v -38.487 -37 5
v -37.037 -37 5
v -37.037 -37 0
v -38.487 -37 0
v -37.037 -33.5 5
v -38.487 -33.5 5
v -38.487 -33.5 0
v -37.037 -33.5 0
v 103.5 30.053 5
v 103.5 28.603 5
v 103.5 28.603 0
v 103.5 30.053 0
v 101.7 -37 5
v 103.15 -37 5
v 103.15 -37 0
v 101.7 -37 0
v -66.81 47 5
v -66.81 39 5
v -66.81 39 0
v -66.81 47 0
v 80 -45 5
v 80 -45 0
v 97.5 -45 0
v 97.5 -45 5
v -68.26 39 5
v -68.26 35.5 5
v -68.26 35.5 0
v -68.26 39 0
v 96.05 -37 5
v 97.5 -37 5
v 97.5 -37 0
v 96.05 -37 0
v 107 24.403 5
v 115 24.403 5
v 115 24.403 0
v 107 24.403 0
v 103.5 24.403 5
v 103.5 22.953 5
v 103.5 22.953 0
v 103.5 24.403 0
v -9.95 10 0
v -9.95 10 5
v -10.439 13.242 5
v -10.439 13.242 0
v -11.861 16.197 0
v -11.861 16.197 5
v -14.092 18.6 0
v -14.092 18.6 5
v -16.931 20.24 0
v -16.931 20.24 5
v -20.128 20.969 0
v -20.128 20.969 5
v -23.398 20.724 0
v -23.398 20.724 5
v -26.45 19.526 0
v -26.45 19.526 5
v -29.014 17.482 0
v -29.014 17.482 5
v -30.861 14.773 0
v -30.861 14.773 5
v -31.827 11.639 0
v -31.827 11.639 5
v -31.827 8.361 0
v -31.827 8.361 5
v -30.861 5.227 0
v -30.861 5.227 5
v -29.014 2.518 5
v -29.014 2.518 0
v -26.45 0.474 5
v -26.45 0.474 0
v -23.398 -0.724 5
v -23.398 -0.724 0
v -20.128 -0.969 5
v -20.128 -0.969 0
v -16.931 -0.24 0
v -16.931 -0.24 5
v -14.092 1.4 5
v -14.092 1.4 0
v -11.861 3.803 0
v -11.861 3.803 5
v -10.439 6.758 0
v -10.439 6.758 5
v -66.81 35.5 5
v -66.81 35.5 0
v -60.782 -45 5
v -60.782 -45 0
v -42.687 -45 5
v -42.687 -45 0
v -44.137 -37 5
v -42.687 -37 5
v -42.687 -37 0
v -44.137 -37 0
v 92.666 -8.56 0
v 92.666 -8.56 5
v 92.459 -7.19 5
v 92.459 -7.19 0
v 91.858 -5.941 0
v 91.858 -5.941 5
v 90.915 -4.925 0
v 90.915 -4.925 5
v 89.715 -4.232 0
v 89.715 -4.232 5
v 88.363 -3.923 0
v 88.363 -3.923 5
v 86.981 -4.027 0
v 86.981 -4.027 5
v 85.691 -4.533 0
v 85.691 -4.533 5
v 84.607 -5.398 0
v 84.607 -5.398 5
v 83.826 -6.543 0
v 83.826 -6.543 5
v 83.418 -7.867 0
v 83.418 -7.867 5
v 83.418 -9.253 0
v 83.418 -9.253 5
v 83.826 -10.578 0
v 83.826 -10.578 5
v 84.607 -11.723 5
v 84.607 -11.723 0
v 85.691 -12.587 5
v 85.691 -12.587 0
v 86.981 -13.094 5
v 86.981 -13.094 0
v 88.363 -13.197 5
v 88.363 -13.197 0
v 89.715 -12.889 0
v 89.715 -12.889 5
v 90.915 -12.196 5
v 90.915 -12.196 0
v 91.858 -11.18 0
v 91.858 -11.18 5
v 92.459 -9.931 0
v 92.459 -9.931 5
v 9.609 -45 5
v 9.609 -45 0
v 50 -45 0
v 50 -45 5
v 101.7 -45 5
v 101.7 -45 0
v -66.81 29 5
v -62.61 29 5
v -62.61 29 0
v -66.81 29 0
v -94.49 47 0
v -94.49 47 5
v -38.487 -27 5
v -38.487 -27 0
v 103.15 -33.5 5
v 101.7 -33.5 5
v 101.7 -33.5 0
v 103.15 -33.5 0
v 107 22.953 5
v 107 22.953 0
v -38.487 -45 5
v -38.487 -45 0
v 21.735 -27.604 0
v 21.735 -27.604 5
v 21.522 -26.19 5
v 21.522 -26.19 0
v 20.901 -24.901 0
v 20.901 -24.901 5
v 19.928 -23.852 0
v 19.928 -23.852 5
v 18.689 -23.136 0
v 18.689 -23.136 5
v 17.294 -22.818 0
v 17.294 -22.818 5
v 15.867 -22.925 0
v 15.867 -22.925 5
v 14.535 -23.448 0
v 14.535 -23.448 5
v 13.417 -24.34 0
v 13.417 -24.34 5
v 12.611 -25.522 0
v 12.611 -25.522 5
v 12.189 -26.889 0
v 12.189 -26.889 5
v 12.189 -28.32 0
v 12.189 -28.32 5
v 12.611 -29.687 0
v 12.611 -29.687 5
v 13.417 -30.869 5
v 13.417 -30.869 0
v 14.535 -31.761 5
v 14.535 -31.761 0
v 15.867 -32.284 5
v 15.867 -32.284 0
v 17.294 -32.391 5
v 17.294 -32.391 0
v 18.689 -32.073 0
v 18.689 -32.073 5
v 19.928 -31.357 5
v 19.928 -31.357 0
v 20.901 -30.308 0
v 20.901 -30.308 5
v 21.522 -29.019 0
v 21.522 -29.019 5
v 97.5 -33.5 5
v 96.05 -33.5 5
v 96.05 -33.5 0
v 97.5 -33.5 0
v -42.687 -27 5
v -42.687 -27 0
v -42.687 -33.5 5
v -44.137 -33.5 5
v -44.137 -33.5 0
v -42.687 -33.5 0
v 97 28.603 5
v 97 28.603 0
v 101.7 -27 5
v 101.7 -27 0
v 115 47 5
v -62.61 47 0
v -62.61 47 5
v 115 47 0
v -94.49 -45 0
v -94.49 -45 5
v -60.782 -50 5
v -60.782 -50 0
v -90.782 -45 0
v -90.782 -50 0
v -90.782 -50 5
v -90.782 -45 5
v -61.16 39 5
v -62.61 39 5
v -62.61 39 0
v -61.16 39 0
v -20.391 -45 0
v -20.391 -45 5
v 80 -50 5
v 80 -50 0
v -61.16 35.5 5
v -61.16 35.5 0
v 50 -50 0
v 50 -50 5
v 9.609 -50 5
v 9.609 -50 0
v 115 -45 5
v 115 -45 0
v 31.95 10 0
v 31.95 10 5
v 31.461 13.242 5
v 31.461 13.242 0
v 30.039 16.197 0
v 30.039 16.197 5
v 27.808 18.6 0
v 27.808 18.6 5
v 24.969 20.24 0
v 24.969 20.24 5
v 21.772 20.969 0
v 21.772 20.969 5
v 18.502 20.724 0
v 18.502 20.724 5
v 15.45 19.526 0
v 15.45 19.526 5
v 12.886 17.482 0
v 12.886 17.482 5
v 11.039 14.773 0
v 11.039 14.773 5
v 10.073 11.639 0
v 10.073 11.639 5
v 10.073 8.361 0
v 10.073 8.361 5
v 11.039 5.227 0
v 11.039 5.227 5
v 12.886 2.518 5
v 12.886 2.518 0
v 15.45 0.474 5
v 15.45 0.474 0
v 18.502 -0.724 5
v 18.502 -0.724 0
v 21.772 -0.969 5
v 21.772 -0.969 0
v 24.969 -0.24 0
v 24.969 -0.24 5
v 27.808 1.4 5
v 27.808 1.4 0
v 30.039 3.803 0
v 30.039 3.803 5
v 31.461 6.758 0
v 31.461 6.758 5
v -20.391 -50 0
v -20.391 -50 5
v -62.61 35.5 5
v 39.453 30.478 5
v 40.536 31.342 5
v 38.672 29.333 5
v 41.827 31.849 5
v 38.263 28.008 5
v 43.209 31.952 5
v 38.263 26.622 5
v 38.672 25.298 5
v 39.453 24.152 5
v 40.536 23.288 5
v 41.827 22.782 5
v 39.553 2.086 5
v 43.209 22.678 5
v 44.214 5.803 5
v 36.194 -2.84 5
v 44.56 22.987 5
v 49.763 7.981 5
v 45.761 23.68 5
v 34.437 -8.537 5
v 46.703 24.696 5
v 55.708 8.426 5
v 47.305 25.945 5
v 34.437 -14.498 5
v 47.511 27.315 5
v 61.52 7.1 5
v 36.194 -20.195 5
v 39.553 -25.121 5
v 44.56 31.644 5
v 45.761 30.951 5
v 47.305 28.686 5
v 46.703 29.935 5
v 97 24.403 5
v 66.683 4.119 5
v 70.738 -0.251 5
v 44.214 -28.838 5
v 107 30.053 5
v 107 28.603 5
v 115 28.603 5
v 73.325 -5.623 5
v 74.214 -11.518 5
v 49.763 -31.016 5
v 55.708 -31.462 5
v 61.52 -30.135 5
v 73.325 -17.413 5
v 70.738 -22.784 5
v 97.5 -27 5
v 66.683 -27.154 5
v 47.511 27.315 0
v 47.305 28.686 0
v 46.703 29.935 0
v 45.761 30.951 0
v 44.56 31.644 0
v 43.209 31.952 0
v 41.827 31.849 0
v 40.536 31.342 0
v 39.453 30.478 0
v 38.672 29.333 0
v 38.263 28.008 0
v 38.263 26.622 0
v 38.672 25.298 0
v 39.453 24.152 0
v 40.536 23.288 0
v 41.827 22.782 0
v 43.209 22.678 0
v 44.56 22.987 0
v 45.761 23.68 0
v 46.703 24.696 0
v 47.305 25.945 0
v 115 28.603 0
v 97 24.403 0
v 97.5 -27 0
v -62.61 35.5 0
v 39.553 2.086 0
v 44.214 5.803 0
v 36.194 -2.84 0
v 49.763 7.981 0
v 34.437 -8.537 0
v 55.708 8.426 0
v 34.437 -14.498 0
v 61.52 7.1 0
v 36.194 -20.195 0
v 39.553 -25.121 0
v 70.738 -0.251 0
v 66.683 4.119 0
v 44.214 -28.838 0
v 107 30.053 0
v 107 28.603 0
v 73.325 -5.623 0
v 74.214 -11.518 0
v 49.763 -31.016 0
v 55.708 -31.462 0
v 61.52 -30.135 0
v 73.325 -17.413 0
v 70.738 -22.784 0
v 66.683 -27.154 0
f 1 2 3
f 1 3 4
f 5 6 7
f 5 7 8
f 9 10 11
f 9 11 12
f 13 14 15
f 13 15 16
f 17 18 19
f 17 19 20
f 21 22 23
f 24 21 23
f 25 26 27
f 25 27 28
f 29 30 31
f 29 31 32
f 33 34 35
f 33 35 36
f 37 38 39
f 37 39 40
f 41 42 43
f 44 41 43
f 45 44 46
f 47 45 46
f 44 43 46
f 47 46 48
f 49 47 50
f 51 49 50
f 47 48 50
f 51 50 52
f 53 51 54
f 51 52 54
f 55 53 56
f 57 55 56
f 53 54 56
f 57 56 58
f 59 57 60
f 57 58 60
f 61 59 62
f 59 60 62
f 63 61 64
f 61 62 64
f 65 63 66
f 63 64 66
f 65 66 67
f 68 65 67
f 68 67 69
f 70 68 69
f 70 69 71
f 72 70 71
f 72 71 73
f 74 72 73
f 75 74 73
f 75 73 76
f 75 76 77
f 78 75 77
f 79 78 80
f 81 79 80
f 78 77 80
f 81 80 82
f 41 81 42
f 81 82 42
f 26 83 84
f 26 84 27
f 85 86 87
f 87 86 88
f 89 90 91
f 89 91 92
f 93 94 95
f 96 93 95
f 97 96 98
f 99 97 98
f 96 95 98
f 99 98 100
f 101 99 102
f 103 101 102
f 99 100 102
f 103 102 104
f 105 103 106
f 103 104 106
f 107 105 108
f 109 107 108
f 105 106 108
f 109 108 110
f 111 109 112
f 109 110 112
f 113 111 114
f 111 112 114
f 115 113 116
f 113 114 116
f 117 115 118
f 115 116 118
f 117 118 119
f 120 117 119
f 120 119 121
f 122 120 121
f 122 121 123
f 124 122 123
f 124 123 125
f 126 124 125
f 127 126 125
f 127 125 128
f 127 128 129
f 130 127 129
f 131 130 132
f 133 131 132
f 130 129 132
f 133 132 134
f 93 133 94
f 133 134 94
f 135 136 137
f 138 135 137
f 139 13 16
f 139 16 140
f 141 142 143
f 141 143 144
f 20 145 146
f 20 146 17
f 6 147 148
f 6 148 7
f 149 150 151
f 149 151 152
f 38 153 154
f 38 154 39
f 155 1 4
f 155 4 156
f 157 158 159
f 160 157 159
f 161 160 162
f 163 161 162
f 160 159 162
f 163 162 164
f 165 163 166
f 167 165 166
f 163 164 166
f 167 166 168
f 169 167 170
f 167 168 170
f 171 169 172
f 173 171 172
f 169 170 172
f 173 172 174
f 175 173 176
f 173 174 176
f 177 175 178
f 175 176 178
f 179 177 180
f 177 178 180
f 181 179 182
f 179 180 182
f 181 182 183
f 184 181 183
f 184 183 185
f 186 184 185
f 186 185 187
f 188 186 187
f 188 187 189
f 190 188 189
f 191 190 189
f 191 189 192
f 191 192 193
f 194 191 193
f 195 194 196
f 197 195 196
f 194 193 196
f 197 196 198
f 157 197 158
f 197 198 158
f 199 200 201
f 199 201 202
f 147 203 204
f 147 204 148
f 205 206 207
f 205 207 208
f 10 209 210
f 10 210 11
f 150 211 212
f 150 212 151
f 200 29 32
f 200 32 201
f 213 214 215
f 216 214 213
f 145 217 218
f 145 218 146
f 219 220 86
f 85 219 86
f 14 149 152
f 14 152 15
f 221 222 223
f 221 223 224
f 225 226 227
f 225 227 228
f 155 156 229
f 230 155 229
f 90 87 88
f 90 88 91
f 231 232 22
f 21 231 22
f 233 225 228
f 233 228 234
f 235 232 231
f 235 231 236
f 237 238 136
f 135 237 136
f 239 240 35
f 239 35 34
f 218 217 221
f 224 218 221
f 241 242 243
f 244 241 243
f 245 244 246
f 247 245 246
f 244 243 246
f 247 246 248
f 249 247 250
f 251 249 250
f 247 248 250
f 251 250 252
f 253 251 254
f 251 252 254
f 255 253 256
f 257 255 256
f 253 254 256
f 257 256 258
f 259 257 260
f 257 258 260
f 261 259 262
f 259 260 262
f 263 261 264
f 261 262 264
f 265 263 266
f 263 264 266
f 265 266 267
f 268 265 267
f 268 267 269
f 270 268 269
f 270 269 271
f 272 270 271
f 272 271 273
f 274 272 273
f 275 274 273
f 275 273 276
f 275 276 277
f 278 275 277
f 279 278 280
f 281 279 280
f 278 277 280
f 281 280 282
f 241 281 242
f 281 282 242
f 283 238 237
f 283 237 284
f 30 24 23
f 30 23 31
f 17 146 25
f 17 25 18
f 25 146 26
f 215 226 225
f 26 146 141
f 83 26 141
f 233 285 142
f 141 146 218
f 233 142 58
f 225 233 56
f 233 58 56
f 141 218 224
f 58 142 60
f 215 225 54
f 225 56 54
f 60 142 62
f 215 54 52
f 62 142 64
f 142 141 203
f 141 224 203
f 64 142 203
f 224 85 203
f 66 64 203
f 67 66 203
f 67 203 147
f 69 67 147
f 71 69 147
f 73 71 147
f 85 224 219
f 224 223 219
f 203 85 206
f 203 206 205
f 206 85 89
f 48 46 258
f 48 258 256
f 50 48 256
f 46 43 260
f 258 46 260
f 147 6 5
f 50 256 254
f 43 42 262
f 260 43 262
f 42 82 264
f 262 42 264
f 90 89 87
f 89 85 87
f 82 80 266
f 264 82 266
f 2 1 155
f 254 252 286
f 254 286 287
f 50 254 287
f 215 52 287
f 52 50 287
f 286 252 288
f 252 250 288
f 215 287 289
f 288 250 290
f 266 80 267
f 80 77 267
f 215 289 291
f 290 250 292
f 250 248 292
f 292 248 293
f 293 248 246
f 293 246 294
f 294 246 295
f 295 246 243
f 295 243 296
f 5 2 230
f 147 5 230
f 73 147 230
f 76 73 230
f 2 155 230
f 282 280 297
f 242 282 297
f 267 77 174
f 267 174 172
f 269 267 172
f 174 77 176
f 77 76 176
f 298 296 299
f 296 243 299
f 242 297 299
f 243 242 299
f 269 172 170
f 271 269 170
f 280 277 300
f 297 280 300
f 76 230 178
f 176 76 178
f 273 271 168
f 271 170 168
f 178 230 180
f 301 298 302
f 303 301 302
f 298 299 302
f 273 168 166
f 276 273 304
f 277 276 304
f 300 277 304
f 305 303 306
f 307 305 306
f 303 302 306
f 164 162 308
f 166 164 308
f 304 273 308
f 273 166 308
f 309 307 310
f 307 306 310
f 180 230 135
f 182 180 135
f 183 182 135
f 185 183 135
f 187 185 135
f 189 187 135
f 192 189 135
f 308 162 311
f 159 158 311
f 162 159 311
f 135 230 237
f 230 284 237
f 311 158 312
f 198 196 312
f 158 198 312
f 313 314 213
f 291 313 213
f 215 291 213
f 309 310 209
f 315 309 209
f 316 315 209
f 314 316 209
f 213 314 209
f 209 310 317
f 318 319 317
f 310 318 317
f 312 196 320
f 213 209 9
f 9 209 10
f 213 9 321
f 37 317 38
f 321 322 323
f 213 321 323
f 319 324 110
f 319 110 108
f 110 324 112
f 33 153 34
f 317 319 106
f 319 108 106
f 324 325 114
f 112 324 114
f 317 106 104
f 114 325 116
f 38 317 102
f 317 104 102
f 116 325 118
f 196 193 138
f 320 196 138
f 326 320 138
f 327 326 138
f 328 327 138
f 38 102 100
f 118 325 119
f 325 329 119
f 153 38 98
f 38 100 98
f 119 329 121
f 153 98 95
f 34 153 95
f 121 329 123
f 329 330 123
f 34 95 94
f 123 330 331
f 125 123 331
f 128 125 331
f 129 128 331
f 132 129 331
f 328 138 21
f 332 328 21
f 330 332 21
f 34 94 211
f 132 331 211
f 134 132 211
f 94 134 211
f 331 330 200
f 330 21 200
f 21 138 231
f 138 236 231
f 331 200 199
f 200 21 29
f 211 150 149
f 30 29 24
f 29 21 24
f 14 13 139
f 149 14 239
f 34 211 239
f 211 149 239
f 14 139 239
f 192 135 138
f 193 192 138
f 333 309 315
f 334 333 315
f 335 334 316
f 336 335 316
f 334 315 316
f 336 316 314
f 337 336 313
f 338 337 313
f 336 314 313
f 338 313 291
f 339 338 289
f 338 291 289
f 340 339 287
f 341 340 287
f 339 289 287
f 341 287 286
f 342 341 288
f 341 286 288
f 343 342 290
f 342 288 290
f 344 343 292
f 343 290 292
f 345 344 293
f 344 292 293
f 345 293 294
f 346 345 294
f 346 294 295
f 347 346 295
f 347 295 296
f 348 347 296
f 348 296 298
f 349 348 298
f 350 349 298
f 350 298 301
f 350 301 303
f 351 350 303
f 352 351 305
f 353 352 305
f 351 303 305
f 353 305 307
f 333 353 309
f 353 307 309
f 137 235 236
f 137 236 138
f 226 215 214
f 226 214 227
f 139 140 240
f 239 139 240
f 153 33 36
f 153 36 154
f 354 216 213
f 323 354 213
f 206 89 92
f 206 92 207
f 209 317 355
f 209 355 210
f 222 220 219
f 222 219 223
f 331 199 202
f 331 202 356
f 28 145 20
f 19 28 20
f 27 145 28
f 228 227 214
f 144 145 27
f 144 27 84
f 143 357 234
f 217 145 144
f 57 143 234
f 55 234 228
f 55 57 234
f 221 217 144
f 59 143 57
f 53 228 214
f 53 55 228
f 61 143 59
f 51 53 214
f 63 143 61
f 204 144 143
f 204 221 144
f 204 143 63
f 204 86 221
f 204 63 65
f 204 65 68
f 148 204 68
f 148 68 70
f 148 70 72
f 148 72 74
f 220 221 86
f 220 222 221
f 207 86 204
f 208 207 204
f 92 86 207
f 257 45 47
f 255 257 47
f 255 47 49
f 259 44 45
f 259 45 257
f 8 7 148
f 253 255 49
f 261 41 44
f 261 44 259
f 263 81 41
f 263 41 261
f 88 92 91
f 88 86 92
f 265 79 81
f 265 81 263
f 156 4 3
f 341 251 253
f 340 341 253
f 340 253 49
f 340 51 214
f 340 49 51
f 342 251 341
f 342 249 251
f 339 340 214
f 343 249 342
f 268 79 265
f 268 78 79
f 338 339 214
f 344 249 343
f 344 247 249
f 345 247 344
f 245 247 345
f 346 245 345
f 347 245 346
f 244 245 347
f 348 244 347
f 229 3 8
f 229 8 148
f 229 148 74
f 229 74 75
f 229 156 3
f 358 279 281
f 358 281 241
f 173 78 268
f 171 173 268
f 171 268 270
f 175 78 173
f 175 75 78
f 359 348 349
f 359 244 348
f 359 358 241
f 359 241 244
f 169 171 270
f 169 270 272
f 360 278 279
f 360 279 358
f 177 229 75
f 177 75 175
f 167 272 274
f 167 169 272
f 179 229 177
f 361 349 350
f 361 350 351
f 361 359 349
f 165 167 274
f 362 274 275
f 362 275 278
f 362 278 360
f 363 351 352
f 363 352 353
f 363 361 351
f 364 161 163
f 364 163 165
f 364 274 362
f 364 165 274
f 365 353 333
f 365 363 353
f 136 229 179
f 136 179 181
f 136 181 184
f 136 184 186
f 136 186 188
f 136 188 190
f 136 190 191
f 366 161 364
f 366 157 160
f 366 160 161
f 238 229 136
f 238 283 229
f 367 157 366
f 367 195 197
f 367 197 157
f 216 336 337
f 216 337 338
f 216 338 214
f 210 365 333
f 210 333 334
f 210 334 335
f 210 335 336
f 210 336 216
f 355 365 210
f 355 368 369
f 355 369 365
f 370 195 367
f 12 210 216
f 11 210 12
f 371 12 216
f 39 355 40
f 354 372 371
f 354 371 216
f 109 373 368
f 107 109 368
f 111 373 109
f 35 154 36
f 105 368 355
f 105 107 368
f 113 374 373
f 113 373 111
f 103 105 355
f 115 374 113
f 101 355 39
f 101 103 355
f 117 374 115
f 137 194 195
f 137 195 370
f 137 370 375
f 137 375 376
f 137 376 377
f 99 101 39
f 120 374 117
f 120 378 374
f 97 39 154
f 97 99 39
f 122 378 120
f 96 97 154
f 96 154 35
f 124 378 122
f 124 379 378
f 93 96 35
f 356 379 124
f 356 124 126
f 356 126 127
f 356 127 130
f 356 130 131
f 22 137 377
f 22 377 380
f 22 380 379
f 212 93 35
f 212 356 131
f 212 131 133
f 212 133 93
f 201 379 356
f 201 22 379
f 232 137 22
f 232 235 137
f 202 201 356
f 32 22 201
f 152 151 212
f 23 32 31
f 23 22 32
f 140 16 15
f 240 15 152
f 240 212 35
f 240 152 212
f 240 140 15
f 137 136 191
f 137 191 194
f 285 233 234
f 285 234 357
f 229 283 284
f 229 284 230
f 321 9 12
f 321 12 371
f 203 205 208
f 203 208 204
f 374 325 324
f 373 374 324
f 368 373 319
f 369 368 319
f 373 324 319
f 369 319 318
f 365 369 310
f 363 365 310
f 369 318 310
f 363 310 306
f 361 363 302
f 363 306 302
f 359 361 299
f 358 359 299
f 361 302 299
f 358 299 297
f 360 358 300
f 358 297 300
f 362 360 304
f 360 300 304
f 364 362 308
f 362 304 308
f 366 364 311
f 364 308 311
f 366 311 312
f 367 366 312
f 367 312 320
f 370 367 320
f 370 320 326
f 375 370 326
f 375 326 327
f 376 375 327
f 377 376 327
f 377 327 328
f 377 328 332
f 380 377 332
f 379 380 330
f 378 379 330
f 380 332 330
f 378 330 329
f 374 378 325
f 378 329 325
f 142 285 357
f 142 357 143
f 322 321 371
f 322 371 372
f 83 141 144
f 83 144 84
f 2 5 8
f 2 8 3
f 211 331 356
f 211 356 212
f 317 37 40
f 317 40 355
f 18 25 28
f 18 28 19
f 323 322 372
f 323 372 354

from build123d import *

# Parameters (mm, degrees)
SKETCH1_W           = 230
SKETCH1_H           = 90
BOSS_EXTRUDE1_DEPTH = 5
CUT_EXTRUDE1_REACH  = 125.592
SKETCH2_R           = 11
SKETCH2_R_2         = 16.75
CUT_EXTRUDE2_REACH  = 125.592
SKETCH3_R           = 4.65
SKETCH3_R_2         = 4.8
MOVE_FACE1_BY       = 2
SKETCH5_W           = 20.50990482
SKETCH5_H           = 126.384873773
CUT_EXTRUDE3_DEPTH  = 5
SKETCH6_W           = 30
SKETCH6_H           = 5
BOSS_EXTRUDE3_DEPTH = 5
CUT_EXTRUDE4_DEPTH  = 10
BOSS_EXTRUDE4_DEPTH = 5
SKETCH8_R           = 20
SKETCH8_R_2         = 4.65
SKETCH8_R_3         = 4.8
SKETCH8_R_4         = 11
CUT_EXTRUDE5_DEPTH  = 5


with BuildPart() as part:
    # Sketch1 → Boss-Extrude1 (new body)
    with BuildSketch(Plane.XY):
        Rectangle(SKETCH1_W, SKETCH1_H)
    extrude(amount=BOSS_EXTRUDE1_DEPTH)

    # Sketch2 → Cut-Extrude1 (cut, up to next)
    with BuildSketch(Plane.XY.offset(5), mode=Mode.PRIVATE) as cut_extrude1_sk1:
        with Locations((-20.95, 10)):
            Circle(SKETCH2_R)
    cut_extrude1_tool1 = extrude(cut_extrude1_sk1.sketch, amount=-CUT_EXTRUDE1_REACH, mode=Mode.PRIVATE) & part.part
    # Sketch2 → Cut-Extrude1 (cut, up to next)
    with BuildSketch(Plane.XY.offset(5), mode=Mode.PRIVATE) as cut_extrude1_sk2:
        with Locations((20.95, 10)):
            Circle(SKETCH2_R)
    cut_extrude1_tool2 = extrude(cut_extrude1_sk2.sketch, amount=-CUT_EXTRUDE1_REACH, mode=Mode.PRIVATE) & part.part
    # Sketch2 → Cut-Extrude1 (cut, up to next)
    with BuildSketch(Plane.XY.offset(5), mode=Mode.PRIVATE) as cut_extrude1_sk3:
        with Locations((49.976927154, -10)):
            Circle(SKETCH2_R_2)
    cut_extrude1_tool3 = extrude(cut_extrude1_sk3.sketch, amount=-CUT_EXTRUDE1_REACH, mode=Mode.PRIVATE) & part.part
    add(cut_extrude1_tool1.solids().sort_by_distance((-20.95, 10, 5))[0], mode=Mode.SUBTRACT)
    add(cut_extrude1_tool2.solids().sort_by_distance((20.95, 10, 5))[0], mode=Mode.SUBTRACT)
    add(cut_extrude1_tool3.solids().sort_by_distance((49.976927, -10, 5))[0], mode=Mode.SUBTRACT)

    # Sketch3 → Cut-Extrude2 (cut, up to next)
    with BuildSketch(Plane(origin=(0, 0, 0), x_dir=(-1, 0, 0), z_dir=(0, 0, -1)), mode=Mode.PRIVATE) as cut_extrude2_sk1:
        with Locations((-42.861480484, 27.315297382)):
            Circle(SKETCH3_R)
    cut_extrude2_tool1 = extrude(cut_extrude2_sk1.sketch, amount=-CUT_EXTRUDE2_REACH, mode=Mode.PRIVATE) & part.part
    # Sketch3 → Cut-Extrude2 (cut, up to next)
    with BuildSketch(Plane(origin=(0, 0, 0), x_dir=(-1, 0, 0), z_dir=(0, 0, -1)), mode=Mode.PRIVATE) as cut_extrude2_sk2:
        with Locations((-88.015918911, -8.560303387)):
            Circle(SKETCH3_R)
    cut_extrude2_tool2 = extrude(cut_extrude2_sk2.sketch, amount=-CUT_EXTRUDE2_REACH, mode=Mode.PRIVATE) & part.part
    # Sketch3 → Cut-Extrude2 (cut, up to next)
    with BuildSketch(Plane(origin=(0, 0, 0), x_dir=(-1, 0, 0), z_dir=(0, 0, -1)), mode=Mode.PRIVATE) as cut_extrude2_sk3:
        with Locations((-16.935196723, -27.604446885)):
            Circle(SKETCH3_R_2)
    cut_extrude2_tool3 = extrude(cut_extrude2_sk3.sketch, amount=-CUT_EXTRUDE2_REACH, mode=Mode.PRIVATE) & part.part
    add(cut_extrude2_tool1.solids().sort_by_distance((42.86148, 27.315297, 0))[0], mode=Mode.SUBTRACT)
    add(cut_extrude2_tool2.solids().sort_by_distance((88.015919, -8.560303, 0))[0], mode=Mode.SUBTRACT)
    add(cut_extrude2_tool3.solids().sort_by_distance((16.935197, -27.604447, 0))[0], mode=Mode.SUBTRACT)

    # Move Face1: a face moved outward by 2.0
    extrude(part.faces().sort_by_distance((0, 45, 2.5))[0], amount=MOVE_FACE1_BY, dir=(0, 1, 0))

    # Sketch5 → Cut-Extrude3 (cut)
    with BuildSketch(Plane(origin=(0, 0, 0), x_dir=(-1, 0, 0), z_dir=(0, 0, -1))):
        with Locations((104.74504759, -16.192436887)):
            Rectangle(SKETCH5_W, SKETCH5_H)
    extrude(amount=-CUT_EXTRUDE3_DEPTH, mode=Mode.SUBTRACT)

    # Sketch6 → Boss-Extrude3 (add)
    with BuildSketch(Plane(origin=(0, 0, 0), x_dir=(-1, 0, 0), z_dir=(0, 0, -1))):
        with Locations((5.391218518, -47.5)):
            Rectangle(SKETCH6_W, SKETCH6_H)
        with Locations((75.782437035, -47.5)):
            Rectangle(SKETCH6_W, SKETCH6_H)
        with Locations((-65, -47.5)):
            Rectangle(SKETCH6_W, SKETCH6_H)
    extrude(amount=-BOSS_EXTRUDE3_DEPTH)

    # Sketch7 → Cut-Extrude4 (cut)
    with BuildSketch(Plane.XY.offset(5)):
        Polygon((-42.686827777, -45), (-42.686827777, -37), (-44.136827777, -37), (-44.136827777, -33.5), (-42.686827777, -33.5), (-42.686827777, -27), (-38.486827777, -27), (-38.486827777, -33.5), (-37.036827777, -33.5), (-37.036827777, -37), (-38.486827777, -37), (-38.486827777, -45), align=None)
        Polygon((97.5, -45), (97.5, -37), (96.05, -37), (96.05, -33.5), (97.5, -33.5), (97.5, -27), (101.7, -27), (101.7, -33.5), (103.15, -33.5), (103.15, -37), (101.7, -37), (101.7, -45), align=None)
        Polygon((115, 24.402956743), (107, 24.402956743), (107, 22.952956743), (103.5, 22.952956743), (103.5, 24.402956743), (97, 24.402956743), (97, 28.602956743), (103.5, 28.602956743), (103.5, 30.052956743), (107, 30.052956743), (107, 28.602956743), (115, 28.602956743), align=None)
        Polygon((-62.609520372, 47), (-62.609520372, 39), (-61.159520372, 39), (-61.159520372, 35.5), (-62.609520372, 35.5), (-62.609520372, 29), (-66.809520372, 29), (-66.809520372, 35.5), (-68.259520372, 35.5), (-68.259520372, 39), (-66.809520372, 39), (-66.809520372, 47), align=None)
    extrude(amount=-CUT_EXTRUDE4_DEPTH, mode=Mode.SUBTRACT)

    # Sketch9 → Boss-Extrude4 (add)
    with BuildSketch(Plane.XY.offset(5)):
        Polygon((-39.58489376, 23.410750341), (-37.52309363, -9.578051742), (-6.596091677, -20.917952458), (6.599429156, -35.969093408), (51.752852007, -37.618533512), (87.628174272, -20.917952458), (101.85459517, 0), (47.084922834, 37.249172102), align=None)
    extrude(amount=-BOSS_EXTRUDE4_DEPTH)

    # Sketch8 → Cut-Extrude5 (cut)
    with BuildSketch(Plane.XY.offset(5)):
        with Locations((54.21355411, -11.517627108)):
            Circle(SKETCH8_R)
        with Locations((42.861480484, 27.315297382)):
            Circle(SKETCH8_R_2)
        with Locations((88.015918911, -8.560303387)):
            Circle(SKETCH8_R_2)
        with Locations((16.935196723, -27.604446885)):
            Circle(SKETCH8_R_3)
        with Locations((20.95, 10)):
            Circle(SKETCH8_R_4)
        with Locations((-20.95, 10)):
            Circle(SKETCH8_R_4)
    extrude(amount=-CUT_EXTRUDE5_DEPTH, mode=Mode.SUBTRACT)


solid = part.part
